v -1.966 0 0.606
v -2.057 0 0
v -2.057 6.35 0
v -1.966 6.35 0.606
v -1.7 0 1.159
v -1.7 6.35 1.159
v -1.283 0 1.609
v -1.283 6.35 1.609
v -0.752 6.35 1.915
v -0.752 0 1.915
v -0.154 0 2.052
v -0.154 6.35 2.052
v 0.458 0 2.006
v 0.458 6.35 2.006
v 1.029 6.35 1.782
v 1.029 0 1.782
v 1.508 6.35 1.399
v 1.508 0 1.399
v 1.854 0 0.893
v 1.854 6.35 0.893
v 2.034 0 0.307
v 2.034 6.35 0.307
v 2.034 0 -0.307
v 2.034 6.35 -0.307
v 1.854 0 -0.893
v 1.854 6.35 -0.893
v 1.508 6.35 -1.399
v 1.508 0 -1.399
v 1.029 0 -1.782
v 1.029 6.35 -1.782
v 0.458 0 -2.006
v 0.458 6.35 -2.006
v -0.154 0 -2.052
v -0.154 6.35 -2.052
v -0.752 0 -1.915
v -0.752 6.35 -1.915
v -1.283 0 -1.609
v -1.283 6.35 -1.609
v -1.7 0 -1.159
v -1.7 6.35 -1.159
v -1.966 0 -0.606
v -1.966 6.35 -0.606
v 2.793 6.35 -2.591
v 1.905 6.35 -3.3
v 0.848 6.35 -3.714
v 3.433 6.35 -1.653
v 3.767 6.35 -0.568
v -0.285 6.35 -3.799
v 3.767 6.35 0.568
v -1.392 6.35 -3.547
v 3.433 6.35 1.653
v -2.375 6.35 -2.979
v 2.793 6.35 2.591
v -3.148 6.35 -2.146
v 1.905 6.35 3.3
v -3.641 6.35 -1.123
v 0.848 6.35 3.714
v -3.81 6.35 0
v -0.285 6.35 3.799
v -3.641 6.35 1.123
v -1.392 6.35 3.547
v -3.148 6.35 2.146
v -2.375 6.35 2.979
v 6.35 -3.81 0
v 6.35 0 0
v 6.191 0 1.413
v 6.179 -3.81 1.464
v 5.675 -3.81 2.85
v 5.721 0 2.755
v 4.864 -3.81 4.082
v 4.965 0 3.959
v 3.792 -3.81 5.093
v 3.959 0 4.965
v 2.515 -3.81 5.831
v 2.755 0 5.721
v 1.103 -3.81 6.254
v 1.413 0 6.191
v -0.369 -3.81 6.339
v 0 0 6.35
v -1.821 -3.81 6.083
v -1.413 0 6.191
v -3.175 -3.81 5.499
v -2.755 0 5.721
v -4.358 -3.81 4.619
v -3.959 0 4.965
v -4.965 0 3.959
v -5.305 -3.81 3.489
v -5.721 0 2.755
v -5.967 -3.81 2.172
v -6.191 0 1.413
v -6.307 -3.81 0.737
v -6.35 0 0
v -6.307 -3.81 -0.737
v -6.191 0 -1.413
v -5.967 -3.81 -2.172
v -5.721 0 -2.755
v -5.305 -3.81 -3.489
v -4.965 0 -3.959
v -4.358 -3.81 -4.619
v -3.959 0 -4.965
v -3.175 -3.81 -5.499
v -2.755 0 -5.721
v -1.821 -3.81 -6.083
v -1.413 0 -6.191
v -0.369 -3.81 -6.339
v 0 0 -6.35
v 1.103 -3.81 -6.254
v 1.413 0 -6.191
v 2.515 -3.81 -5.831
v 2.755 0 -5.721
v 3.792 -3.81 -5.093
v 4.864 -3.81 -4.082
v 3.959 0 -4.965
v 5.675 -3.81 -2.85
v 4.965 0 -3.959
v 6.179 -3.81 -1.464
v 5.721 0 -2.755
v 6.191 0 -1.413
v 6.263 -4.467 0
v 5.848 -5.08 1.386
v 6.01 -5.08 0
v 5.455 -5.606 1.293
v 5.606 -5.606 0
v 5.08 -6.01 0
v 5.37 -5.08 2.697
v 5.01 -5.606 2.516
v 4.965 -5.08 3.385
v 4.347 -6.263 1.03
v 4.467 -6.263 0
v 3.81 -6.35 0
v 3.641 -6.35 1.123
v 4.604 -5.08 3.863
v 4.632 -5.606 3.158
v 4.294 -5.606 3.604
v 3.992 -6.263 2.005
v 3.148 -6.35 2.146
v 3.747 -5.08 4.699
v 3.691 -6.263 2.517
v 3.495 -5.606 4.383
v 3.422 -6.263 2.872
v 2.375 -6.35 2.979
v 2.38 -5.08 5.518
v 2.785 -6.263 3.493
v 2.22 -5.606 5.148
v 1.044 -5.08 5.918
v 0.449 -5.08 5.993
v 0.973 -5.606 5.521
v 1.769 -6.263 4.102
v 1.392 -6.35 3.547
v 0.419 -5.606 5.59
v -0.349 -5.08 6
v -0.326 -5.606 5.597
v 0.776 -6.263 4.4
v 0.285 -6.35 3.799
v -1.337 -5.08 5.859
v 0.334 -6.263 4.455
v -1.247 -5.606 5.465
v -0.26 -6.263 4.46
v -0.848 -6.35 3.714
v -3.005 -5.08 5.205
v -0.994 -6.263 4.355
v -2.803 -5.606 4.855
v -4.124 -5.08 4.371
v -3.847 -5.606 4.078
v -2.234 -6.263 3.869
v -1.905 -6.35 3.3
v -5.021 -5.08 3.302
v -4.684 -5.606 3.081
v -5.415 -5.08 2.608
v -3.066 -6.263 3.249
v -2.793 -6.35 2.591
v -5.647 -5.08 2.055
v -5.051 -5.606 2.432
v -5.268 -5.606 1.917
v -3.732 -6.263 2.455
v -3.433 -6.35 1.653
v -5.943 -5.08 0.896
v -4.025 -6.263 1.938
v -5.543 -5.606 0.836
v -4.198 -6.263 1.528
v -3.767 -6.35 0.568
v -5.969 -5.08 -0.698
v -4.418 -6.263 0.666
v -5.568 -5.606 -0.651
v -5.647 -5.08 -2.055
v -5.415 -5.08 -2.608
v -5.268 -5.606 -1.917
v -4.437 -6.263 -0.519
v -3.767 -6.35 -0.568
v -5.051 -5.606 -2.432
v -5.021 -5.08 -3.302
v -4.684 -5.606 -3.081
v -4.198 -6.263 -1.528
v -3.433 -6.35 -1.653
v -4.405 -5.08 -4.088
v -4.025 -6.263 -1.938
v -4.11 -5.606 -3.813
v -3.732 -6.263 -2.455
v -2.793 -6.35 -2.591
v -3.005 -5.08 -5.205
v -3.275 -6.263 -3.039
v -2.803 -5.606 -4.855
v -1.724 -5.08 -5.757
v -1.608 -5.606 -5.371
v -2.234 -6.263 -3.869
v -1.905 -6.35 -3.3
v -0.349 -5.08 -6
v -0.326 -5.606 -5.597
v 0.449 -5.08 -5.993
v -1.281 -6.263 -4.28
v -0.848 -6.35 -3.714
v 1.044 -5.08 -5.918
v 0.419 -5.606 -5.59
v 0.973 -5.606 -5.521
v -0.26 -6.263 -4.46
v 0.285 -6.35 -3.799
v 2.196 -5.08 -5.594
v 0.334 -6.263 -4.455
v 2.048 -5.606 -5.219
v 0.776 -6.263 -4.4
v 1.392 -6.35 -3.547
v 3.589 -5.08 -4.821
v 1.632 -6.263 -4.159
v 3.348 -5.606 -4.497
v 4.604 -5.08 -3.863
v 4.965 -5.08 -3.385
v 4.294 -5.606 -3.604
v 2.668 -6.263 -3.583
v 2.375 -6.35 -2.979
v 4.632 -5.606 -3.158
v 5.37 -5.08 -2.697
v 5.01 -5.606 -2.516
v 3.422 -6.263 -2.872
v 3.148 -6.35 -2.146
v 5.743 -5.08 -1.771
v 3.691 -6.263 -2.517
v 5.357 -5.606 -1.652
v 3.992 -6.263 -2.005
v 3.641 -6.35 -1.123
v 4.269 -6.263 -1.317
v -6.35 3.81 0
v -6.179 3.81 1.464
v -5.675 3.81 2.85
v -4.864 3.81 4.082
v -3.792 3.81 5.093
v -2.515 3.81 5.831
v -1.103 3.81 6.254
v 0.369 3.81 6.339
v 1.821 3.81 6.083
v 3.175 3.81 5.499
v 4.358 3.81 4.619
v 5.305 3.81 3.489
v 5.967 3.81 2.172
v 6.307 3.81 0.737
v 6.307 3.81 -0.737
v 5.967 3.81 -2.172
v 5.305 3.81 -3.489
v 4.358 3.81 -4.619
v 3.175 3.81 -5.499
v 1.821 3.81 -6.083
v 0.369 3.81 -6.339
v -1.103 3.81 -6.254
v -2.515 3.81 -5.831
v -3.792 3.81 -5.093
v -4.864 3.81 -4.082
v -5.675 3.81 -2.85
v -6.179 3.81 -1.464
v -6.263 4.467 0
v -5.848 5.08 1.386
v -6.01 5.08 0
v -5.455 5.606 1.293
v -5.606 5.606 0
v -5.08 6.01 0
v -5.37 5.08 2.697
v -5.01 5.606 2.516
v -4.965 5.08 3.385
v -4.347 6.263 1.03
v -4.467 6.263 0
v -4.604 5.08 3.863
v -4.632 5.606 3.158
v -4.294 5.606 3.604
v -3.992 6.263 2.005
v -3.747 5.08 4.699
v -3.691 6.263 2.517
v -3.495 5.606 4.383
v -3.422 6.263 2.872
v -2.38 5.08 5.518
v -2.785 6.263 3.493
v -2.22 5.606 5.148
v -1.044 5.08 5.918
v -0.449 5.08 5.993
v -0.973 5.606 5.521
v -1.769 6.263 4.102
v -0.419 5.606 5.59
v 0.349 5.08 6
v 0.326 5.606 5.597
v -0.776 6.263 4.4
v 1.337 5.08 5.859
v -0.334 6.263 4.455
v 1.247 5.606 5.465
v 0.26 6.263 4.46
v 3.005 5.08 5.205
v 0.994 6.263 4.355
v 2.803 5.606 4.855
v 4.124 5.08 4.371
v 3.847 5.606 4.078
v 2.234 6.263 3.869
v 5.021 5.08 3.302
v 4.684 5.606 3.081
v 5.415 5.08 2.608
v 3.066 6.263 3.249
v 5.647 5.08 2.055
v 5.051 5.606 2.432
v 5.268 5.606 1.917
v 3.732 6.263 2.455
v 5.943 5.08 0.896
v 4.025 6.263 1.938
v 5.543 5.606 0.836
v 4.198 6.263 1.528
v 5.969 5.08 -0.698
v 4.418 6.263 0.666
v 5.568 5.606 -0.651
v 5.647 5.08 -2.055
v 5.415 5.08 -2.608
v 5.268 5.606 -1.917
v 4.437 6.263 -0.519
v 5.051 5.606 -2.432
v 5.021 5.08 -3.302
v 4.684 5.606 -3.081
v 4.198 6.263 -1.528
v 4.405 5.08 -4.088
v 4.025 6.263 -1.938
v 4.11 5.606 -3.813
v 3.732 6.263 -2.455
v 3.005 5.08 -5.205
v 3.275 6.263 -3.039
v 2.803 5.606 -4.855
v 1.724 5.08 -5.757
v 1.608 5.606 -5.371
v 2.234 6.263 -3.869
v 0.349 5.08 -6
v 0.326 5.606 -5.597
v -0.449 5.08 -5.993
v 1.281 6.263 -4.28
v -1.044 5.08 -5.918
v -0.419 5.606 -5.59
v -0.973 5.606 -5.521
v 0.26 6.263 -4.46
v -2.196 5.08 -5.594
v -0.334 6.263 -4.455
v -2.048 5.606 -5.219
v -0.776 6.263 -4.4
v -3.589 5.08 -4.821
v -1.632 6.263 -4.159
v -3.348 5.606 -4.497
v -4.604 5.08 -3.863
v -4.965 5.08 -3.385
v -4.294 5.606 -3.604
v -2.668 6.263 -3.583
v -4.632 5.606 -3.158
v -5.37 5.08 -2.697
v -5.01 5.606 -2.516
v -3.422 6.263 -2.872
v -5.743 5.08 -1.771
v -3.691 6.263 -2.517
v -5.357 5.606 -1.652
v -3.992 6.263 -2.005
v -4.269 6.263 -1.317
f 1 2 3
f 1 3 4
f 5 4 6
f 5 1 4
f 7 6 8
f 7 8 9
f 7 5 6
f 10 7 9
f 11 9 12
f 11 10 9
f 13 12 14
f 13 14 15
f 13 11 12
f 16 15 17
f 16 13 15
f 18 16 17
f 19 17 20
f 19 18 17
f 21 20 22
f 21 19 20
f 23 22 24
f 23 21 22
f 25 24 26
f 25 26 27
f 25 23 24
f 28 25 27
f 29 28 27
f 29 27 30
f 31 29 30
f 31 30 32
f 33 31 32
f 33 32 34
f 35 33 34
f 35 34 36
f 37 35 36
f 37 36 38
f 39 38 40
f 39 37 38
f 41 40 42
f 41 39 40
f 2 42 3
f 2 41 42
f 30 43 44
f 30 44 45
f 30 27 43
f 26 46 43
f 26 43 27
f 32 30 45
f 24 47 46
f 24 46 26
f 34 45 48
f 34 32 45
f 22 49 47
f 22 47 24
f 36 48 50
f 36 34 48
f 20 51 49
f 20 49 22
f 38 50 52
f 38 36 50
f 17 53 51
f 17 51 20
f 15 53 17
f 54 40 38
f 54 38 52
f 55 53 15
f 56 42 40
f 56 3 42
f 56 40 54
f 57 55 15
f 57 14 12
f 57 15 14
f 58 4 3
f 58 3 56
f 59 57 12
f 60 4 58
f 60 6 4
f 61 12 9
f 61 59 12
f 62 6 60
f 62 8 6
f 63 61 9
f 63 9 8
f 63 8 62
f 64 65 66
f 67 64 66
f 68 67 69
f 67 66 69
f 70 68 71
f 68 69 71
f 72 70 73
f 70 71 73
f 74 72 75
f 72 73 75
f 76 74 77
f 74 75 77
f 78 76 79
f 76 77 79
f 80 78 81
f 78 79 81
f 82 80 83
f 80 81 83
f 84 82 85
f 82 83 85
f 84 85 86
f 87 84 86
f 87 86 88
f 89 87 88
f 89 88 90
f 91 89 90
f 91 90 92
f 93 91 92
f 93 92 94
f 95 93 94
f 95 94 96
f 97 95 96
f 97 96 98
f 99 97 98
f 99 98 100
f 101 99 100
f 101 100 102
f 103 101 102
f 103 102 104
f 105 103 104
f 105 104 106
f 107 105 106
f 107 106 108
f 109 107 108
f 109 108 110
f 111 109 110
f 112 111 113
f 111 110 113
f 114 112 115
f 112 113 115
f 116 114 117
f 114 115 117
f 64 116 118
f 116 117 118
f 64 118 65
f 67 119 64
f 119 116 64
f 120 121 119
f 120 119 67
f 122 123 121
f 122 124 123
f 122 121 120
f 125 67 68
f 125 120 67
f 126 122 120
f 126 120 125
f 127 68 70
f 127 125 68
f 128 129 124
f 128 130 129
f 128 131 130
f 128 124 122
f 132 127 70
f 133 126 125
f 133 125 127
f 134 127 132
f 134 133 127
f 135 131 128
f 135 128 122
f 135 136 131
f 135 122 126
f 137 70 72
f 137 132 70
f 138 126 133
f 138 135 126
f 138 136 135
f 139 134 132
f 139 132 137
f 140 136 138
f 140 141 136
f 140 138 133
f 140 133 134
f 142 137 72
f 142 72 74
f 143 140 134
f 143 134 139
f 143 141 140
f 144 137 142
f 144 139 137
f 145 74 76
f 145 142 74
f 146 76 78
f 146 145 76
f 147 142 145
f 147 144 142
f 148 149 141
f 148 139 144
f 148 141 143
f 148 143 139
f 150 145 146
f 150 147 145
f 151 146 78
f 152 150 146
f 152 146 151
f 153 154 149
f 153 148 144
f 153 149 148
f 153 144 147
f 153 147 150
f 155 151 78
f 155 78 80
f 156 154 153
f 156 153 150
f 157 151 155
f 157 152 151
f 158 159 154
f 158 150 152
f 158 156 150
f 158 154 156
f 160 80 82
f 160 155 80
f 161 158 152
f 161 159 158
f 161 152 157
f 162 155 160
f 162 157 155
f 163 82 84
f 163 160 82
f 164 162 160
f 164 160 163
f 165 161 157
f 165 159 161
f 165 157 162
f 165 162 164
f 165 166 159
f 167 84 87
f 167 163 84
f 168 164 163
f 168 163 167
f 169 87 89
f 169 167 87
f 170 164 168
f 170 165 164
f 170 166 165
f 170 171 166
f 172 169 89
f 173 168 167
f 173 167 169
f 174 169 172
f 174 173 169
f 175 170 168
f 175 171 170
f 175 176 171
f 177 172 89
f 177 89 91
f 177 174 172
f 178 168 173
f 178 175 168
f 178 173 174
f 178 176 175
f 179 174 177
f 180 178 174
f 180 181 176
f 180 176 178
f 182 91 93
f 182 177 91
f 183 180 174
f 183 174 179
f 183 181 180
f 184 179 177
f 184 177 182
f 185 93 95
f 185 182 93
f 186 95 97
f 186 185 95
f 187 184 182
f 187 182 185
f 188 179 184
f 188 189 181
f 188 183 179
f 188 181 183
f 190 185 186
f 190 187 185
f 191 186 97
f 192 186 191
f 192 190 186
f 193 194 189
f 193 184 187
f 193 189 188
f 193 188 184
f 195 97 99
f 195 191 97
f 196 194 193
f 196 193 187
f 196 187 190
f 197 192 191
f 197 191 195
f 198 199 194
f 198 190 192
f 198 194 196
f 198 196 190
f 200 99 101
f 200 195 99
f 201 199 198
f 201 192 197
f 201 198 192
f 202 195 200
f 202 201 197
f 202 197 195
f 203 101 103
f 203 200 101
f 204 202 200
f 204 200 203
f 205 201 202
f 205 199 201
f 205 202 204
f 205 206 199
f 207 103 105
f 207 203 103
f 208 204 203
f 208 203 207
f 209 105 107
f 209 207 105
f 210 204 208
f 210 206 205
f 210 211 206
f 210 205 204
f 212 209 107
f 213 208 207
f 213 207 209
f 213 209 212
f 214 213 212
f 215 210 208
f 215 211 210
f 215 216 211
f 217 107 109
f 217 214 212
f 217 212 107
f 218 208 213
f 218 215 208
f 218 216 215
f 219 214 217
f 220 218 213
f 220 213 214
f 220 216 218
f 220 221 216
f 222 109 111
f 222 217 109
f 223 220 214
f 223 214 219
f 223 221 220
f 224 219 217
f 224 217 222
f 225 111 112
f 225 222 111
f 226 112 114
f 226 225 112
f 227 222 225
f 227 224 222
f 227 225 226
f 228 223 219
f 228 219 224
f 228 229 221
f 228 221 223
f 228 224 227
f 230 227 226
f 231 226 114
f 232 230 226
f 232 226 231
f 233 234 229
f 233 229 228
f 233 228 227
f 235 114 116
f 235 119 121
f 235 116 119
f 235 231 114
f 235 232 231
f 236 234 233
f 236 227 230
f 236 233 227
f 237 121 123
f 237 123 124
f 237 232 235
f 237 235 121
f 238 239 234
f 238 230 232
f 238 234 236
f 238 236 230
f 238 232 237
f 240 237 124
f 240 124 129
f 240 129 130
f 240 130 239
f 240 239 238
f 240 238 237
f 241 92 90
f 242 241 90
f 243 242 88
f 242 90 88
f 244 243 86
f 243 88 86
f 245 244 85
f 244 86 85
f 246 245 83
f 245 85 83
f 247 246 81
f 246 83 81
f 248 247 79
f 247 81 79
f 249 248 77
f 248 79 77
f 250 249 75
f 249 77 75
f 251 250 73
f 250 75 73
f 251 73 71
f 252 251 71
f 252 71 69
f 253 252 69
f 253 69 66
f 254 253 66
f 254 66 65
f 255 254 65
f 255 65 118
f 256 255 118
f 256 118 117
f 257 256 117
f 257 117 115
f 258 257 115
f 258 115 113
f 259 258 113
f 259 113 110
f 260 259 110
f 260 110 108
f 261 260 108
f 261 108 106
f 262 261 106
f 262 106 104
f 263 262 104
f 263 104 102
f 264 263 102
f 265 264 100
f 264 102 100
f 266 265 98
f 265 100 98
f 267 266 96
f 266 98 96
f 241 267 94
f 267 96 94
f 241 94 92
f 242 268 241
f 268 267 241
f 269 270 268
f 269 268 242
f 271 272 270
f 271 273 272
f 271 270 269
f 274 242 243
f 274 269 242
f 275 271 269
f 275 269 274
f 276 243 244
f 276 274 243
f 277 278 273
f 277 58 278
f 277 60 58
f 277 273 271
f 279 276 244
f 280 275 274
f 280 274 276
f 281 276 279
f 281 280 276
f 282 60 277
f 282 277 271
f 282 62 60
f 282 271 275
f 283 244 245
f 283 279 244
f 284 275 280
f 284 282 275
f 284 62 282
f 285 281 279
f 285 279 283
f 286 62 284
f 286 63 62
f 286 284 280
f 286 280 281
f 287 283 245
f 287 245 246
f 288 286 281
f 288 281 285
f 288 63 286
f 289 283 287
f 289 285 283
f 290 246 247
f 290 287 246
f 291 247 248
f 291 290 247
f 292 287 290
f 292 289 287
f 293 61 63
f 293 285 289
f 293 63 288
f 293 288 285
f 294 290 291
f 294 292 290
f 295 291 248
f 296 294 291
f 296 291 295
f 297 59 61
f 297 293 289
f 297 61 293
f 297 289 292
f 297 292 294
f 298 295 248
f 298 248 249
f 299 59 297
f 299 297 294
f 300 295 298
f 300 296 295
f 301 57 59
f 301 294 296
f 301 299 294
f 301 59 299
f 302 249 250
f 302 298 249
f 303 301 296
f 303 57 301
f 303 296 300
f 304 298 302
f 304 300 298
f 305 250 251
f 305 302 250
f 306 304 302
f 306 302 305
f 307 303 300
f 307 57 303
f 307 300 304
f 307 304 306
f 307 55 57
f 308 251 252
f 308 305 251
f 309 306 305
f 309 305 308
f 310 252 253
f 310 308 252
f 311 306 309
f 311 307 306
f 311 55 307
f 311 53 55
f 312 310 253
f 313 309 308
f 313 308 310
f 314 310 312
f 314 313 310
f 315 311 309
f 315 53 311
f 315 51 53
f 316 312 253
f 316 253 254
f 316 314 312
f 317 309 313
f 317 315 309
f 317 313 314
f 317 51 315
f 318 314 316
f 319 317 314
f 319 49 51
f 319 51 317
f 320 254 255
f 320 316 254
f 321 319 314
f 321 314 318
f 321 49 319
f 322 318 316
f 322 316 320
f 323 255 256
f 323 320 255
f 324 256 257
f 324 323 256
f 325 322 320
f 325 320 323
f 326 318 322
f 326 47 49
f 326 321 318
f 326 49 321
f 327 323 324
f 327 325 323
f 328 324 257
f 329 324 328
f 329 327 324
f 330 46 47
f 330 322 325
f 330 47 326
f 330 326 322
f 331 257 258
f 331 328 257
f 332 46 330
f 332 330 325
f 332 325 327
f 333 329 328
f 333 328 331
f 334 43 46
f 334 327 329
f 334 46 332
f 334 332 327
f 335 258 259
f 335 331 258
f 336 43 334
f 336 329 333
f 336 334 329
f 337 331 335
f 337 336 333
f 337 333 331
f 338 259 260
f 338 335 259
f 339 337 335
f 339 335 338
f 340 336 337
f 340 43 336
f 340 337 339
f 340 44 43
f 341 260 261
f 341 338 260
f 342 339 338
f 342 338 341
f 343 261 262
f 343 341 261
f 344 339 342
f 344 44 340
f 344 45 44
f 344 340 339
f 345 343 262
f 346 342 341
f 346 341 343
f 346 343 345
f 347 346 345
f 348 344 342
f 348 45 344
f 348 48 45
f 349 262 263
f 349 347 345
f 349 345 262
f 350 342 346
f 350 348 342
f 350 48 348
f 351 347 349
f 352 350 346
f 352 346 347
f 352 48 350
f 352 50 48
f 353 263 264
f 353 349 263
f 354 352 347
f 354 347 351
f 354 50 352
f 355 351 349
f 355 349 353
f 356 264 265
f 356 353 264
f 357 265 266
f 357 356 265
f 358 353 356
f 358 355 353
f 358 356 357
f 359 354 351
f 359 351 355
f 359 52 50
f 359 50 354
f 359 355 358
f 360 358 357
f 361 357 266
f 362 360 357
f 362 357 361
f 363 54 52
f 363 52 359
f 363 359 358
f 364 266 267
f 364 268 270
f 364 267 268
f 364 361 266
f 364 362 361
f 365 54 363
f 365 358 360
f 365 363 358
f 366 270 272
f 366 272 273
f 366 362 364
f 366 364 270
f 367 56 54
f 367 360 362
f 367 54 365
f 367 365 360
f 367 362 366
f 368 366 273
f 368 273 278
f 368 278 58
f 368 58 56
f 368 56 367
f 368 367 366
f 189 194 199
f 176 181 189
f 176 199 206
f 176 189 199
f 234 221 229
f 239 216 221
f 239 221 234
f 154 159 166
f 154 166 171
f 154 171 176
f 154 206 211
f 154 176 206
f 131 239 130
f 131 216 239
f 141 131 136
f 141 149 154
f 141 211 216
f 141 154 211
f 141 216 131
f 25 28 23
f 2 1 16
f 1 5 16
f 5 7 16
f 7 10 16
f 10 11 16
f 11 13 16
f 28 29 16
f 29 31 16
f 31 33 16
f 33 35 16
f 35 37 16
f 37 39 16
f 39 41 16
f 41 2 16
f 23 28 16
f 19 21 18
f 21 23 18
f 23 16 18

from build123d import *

# Parameters (mm, degrees)
F0_R     = 6.35
F1_DEPTH = 6.35
F2_R     = 6.35
F2_R_2   = 2.0574
F3_DEPTH = 6.35
F4_R     = 2.54


with BuildPart() as f1:
    # F0 (on Front) → F1 (new body)
    with BuildSketch(Plane.XZ):
        Circle(F0_R)
    extrude(amount=F1_DEPTH)

    # F2 (on face) → F3 (join)
    with BuildSketch(Plane(origin=(0, 0, 0), x_dir=(-1, 0, 0), z_dir=(0, 1, 0))):
        Circle(F2_R)
        Circle(F2_R_2, mode=Mode.SUBTRACT)
    extrude(amount=F3_DEPTH)

    # F4
    f4_edges = [f1.edges().sort_by_distance(p)[0] for p in [
        (-6.35, -6.35, 0),
        (6.35, 6.35, 0),
    ]]
    fillet(f4_edges, radius=F4_R)


solid = f1.part
